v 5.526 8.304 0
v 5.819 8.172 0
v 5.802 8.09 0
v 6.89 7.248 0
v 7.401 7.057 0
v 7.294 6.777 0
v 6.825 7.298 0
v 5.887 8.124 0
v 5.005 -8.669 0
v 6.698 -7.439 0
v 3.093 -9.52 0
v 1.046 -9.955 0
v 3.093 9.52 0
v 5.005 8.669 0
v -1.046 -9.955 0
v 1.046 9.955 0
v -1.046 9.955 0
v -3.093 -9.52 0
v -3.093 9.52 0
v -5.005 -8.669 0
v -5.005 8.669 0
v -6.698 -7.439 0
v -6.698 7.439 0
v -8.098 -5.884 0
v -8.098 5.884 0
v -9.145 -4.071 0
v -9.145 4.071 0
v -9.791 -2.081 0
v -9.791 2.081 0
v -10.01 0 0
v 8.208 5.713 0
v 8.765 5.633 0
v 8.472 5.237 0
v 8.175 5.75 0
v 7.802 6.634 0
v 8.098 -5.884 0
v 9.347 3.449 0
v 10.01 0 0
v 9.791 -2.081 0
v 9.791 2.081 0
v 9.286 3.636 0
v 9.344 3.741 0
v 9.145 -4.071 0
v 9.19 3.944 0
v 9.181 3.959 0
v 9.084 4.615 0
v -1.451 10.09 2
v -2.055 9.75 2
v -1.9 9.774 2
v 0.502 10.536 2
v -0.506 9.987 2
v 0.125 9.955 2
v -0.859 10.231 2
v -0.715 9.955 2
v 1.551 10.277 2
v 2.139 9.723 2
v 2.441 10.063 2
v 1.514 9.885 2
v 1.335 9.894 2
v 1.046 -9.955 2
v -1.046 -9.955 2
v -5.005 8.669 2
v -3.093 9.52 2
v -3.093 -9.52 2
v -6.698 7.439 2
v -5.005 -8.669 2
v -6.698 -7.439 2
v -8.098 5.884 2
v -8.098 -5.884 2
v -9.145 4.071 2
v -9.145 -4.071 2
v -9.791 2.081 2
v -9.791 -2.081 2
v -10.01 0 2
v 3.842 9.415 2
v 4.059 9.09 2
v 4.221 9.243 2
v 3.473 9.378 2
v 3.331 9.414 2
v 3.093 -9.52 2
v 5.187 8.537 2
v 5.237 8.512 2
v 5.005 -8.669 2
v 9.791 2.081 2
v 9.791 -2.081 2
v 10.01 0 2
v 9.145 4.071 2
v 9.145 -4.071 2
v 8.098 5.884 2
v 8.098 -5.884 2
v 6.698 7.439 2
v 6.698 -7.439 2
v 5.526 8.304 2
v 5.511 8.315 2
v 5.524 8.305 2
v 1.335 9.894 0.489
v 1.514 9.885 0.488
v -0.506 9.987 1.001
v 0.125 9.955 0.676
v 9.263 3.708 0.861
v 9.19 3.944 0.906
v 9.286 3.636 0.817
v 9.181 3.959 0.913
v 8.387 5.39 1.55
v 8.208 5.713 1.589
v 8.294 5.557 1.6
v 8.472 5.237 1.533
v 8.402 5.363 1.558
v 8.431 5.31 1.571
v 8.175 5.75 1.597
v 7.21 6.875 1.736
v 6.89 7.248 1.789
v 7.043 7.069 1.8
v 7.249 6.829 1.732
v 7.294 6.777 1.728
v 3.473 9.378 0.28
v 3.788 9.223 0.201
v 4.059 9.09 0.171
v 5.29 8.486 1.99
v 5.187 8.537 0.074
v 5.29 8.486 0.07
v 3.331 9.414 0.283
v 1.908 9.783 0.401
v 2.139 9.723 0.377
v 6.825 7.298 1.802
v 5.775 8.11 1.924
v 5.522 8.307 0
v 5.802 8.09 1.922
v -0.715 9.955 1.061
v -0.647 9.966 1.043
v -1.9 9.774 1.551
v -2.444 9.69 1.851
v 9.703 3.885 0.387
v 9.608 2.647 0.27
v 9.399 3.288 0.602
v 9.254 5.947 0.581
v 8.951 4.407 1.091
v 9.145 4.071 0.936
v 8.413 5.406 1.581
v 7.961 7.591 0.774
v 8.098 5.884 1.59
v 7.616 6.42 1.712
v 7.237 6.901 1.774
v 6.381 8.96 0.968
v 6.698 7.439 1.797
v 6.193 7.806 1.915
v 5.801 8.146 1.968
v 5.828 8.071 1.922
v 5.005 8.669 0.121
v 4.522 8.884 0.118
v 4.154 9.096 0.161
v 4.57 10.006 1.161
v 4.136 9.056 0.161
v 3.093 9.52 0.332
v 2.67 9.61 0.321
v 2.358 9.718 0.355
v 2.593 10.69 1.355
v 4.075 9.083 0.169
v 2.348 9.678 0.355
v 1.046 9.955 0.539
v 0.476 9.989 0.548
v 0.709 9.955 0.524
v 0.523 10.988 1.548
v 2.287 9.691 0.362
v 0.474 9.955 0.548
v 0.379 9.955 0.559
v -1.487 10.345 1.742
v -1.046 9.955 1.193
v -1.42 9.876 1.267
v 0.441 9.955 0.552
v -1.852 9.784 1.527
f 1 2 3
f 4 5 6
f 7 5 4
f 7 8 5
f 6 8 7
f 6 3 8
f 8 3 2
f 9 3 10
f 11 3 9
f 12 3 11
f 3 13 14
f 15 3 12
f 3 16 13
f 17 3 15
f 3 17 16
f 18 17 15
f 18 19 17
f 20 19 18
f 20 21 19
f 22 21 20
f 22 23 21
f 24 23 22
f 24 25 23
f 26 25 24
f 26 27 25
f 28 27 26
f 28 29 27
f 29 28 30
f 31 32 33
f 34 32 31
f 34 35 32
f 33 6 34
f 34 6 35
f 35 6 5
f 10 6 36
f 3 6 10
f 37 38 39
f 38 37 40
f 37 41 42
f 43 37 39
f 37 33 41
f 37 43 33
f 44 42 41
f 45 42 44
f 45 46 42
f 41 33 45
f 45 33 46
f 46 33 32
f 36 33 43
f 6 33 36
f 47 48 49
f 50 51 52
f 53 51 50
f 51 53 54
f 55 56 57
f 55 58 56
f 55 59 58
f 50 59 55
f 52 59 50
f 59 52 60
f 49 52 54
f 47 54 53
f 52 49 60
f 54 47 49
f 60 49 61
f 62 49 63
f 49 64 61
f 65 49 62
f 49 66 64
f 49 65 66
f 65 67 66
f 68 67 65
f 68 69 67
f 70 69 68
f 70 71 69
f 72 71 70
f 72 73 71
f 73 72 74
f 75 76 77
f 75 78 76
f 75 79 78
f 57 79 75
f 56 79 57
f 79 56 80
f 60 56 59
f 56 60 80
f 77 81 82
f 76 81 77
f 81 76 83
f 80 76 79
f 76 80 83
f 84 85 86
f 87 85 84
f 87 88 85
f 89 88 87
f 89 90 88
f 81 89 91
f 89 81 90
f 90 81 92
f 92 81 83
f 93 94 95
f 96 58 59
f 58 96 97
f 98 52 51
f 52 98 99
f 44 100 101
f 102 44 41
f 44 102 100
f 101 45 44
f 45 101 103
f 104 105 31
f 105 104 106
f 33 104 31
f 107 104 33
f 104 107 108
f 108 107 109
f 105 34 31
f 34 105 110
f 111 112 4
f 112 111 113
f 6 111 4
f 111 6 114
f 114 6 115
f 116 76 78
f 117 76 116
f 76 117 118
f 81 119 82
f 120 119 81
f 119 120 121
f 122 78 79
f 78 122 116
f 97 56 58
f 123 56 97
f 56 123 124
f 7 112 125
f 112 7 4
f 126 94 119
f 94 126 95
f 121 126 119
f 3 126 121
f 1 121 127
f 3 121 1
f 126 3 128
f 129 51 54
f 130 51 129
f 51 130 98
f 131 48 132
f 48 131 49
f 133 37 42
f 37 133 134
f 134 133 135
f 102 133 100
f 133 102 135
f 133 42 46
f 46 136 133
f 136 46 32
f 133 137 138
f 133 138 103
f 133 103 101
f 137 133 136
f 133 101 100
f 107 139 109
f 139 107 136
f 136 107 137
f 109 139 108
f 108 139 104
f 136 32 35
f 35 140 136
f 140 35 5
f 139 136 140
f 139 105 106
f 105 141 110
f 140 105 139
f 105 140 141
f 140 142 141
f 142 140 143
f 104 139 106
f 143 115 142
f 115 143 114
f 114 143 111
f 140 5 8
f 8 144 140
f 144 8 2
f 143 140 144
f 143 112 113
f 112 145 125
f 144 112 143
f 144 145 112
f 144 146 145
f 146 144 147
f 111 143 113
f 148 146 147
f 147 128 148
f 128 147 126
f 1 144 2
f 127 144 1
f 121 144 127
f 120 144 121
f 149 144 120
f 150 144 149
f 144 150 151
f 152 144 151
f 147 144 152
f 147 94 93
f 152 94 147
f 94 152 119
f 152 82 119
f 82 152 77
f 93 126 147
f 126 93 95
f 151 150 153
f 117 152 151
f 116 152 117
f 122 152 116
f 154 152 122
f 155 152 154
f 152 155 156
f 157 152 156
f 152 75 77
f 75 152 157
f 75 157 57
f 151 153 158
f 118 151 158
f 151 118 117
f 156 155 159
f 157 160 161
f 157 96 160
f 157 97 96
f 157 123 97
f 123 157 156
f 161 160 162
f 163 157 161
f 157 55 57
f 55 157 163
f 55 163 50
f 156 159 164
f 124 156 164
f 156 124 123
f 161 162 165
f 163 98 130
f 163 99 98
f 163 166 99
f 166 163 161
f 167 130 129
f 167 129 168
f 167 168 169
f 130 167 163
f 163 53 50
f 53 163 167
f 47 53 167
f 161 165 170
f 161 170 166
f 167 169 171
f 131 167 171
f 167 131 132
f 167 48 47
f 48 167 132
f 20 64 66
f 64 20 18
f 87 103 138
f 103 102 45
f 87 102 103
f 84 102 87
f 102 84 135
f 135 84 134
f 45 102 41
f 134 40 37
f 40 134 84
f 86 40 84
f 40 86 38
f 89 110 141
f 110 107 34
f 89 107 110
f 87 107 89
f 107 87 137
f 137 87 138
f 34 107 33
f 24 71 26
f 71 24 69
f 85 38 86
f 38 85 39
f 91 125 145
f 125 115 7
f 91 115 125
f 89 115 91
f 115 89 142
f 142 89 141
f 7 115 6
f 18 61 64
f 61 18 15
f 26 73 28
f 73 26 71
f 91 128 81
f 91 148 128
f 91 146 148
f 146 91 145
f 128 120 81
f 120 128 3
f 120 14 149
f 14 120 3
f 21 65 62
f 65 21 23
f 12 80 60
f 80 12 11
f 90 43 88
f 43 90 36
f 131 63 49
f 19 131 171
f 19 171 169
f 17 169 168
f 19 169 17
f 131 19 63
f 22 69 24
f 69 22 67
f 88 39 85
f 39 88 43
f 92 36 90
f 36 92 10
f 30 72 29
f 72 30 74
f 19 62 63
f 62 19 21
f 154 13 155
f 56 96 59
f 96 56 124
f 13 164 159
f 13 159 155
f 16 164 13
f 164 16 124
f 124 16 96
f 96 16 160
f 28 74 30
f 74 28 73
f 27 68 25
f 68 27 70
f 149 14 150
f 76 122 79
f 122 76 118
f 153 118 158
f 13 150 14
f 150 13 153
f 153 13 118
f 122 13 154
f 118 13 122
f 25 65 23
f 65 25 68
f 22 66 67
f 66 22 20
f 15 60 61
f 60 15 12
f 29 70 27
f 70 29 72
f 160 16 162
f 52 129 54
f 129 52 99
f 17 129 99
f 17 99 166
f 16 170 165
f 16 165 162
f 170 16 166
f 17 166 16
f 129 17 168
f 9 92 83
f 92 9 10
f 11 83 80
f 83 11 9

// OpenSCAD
// Generated by SolidPython 1.1.3 on 2026-01-16 09:16:53


union() {
	intersection() {
		polyhedron(convexity = 2, faces = [[0, 1, 5], [1, 6, 5], [1, 2, 6], [2, 7, 6], [2, 3, 7], [3, 8, 7], [3, 4, 8], [4, 9, 8], [0, 9, 4], [0, 5, 9], [5, 6, 10], [6, 11, 10], [6, 7, 11], [7, 12, 11], [7, 8, 12], [8, 13, 12], [8, 9, 13], [9, 14, 13], [5, 14, 9], [5, 10, 14], [10, 11, 15], [11, 16, 15], [11, 12, 16], [12, 17, 16], [12, 13, 17], [13, 18, 17], [13, 14, 18], [14, 19, 18], [10, 19, 14], [10, 15, 19], [15, 16, 20], [16, 21, 20], [16, 17, 21], [17, 22, 21], [17, 18, 22], [18, 23, 22], [18, 19, 23], [19, 24, 23], [15, 24, 19], [15, 20, 24], [20, 21, 25], [21, 26, 25], [21, 22, 26], [22, 27, 26], [22, 23, 27], [23, 28, 27], [23, 24, 28], [24, 29, 28], [20, 29, 24], [20, 25, 29], [25, 26, 30], [26, 31, 30], [26, 27, 31], [27, 32, 31], [27, 28, 32], [28, 33, 32], [28, 29, 33], [29, 34, 33], [25, 34, 29], [25, 30, 34], [30, 31, 35], [31, 36, 35], [31, 32, 36], [32, 37, 36], [32, 33, 37], [33, 38, 37], [33, 34, 38], [34, 39, 38], [30, 39, 34], [30, 35, 39], [35, 36, 40], [36, 41, 40], [36, 37, 41], [37, 42, 41], [37, 38, 42], [38, 43, 42], [38, 39, 43], [39, 44, 43], [35, 44, 39], [35, 40, 44], [40, 41, 45], [41, 46, 45], [41, 42, 46], [42, 47, 46], [42, 43, 47], [43, 48, 47], [43, 44, 48], [44, 49, 48], [40, 49, 44], [40, 45, 49], [45, 46, 50], [46, 51, 50], [46, 47, 51], [47, 52, 51], [47, 48, 52], [48, 53, 52], [48, 49, 53], [49, 54, 53], [45, 54, 49], [45, 50, 54], [50, 51, 55], [51, 56, 55], [51, 52, 56], [52, 57, 56], [52, 53, 57], [53, 58, 57], [53, 54, 58], [54, 59, 58], [50, 59, 54], [50, 55, 59], [0, 2, 1], [55, 56, 57], [0, 3, 2], [55, 57, 58], [0, 4, 3], [55, 58, 59]], points = [[7.9900000000, 0.0000000000, -1.0000000000], [8.9900000000, 0.0000000000, 0.0000000000], [7.9900000000, 0.0000000000, 1.0000000000], [6.9900000000, 0.0000000000, 0.0000000000], [6.9900000000, 0.0000000000, -1.0000000000], [8.5633109026, 1.6504428974, -0.8064516129], [9.5452395998, 1.8396941418, 0.1935483871], [8.5633109026, 1.6504428974, 1.1935483871], [7.5813822053, 1.4611916530, 0.1935483871], [7.5813822053, 1.4611916530, -0.8064516129], [8.7747649087, 3.5128859559, -0.6129032258], [9.7031328417, 3.8845484116, 0.3870967742], [8.7747649087, 3.5128859559, 1.3870967742], [7.8463969757, 3.1412235002, 0.3870967742], [7.8463969757, 3.1412235002, -0.6129032258], [8.4125353283, 5.4064081746, -0.4193548387], [9.2537888611, 5.9470489920, 0.5806451613], [8.4125353283, 5.4064081746, 1.5806451613], [7.5712817955, 4.8657673571, 0.5806451613], [7.5712817955, 4.8657673571, -0.4193548387], [7.2373403811, 6.9007901148, -0.2258064516], [7.9610744192, 7.5908691263, 0.7741935484], [7.2373403811, 6.9007901148, 1.7741935484], [6.5136063429, 6.2107111033, 0.7741935484], [6.5136063429, 6.2107111033, -0.2258064516], [5.8005690957, 8.1457595205, -0.0322580645], [6.3806260053, 8.9603354726, 0.9677419355], [5.8005690957, 8.1457595205, 1.9677419355], [5.2205121861, 7.3311835685, 0.9677419355], [5.2205121861, 7.3311835685, -0.0322580645], [4.1541501300, 9.0963199535, 0.1612903226], [4.5695651430, 10.0059519489, 1.1612903226], [4.1541501300, 9.0963199535, 2.1612903226], [3.7387351170, 8.1866879582, 1.1612903226], [3.7387351170, 8.1866879582, 0.1612903226], [2.3575893551, 9.7181156832, 0.3548387097], [2.5933482906, 10.6899272516, 1.3548387097], [2.3575893551, 9.7181156832, 2.3548387097], [2.1218304196, 8.7463041149, 1.3548387097], [2.1218304196, 8.7463041149, 0.3548387097], [0.4758191582, 9.9886733918, 0.5483870968], [0.5234010741, 10.9875407310, 1.5483870968], [0.4758191582, 9.9886733918, 2.5483870968], [0.4282372424, 8.9898060526, 1.5483870968], [0.4282372424, 8.9898060526, 0.5483870968], [-1.3451339759, 9.3556123011, 0.7419354839], [-1.4874488142, 10.3454337430, 1.7419354839], [-1.3451339759, 9.3556123011, 2.7419354839], [-1.2028191377, 8.3657908592, 1.7419354839], [-1.2028191377, 8.3657908592, 0.7419354839], [-2.8523299746, 8.2412662308, 0.9354838710], [-3.1793979380, 9.1862670496, 1.9354838710], [-2.8523299746, 8.2412662308, 2.9354838710], [-2.5252620113, 7.2962654121, 1.9354838710], [-2.5252620113, 7.2962654121, 0.9354838710], [-3.9950000000, 6.9195429762, 1.1290322581], [-4.4950000000, 7.7855683800, 2.1290322581], [-3.9950000000, 6.9195429762, 3.1290322581], [-3.4950000000, 6.0535175725, 2.1290322581], [-3.4950000000, 6.0535175725, 1.1290322581]]);
		difference() {
			cylinder($fn = 31, h = 2, r1 = 12.0100000000, r2 = 12.0100000000);
			cylinder($fn = 31, h = 2, r1 = 10, r2 = 10);
		}
	}
	cylinder(h = 2, r = 10.0100000000);
}
/***********************************************
*********      SolidPython code:      **********
************************************************
 
#! /usr/bin/env python3
import math
from math import radians
from typing import Sequence, Tuple, Union

from euclid3 import Point3, Vector3

# NOTE: The PyEuclid on PyPi doesn't include several elements added to
# the module as of 13 Feb 2013.  Add them here until euclid supports them
# TODO: when euclid updates, remove this cruft. -ETJ 13 Feb 2013
from solid import run_euclid_patch, scad_render_to_file
from solid.objects import cylinder, polyhedron
from solid.utils import EPSILON, UP_VEC, bounding_box

run_euclid_patch()

P2 = Tuple[float, float]
P3 = Tuple[float, float, float]
P23 = Union[P2, P3]
Points = Sequence[P23]


def map_segment(
    x: float, domain_min: float, domain_max: float, range_min: float, range_max: float
) -> float:
    if domain_min == domain_max or range_min == range_max:
        return range_min
    proportion = (x - domain_min) / (domain_max - domain_min)
    return (1 - proportion) * range_min + proportion * range_max


def thread(
    outline_pts: Points,
    inner_rad: float,
    pitch: float,
    length: float,
    external: bool = True,
    segments_per_rot: int = 32,
    neck_in_degrees: float = 0,
    neck_out_degrees: float = 0,
    rad_2: float = None,
    inverse_thread_direction: bool = False,
):
    """
    Sweeps outline_pts (an array of points describing a closed polygon in XY)
    through a spiral.

    :param outline_pts: a list of points (NOT an OpenSCAD polygon) that define the cross section of the thread
    :type outline_pts: list

    :param inner_rad: radius of cylinder the screw will wrap around; at base of screw
    :type inner_rad: number

    :param pitch: height for one revolution; must be <= the height of outline_pts bounding box to avoid self-intersection
    :type pitch: number

    :param length: distance from bottom-most point of screw to topmost
    :type length: number

    :param external: if True, the cross-section is external to a cylinder. If False,the segment is internal to it, and outline_pts will be mirrored right-to-left
    :type external: bool

    :param segments_per_rot: segments per rotation
    :type segments_per_rot: int

    :param neck_in_degrees: degrees through which the outer edge of the screw thread will move from a thickness of zero (inner_rad) to its full thickness
    :type neck_in_degrees: number

    :param neck_out_degrees: degrees through which outer edge of the screw thread will move from full thickness back to zero
    :type neck_out_degrees: number

    :param rad_2: radius of cylinder the screw will wrap around at top of screw. Defaults to inner_rad
    :type rad_2: number

    NOTE: This functions works by creating and returning one huge polyhedron, with
    potentially thousands of faces.  An alternate approach would make one single
    polyhedron,then repeat it over and over in the spiral shape, unioning them
    all together.  This would create a similar number of SCAD objects and
    operations, but still require a lot of transforms and unions to be done
    in the SCAD code rather than in the python, as here.  Also would take some
    doing to make the neck-in work as well.  Not sure how the two approaches
    compare in terms of render-time. -ETJ 16 Mar 2011

    NOTE: if pitch is less than or equal to the height of each tooth (outline_pts),
    OpenSCAD will likely crash, since the resulting screw would self-intersect
    all over the place.  For screws with essentially no space between
    threads, (i.e., pitch=tooth_height), I use pitch= tooth_height+EPSILON,
    since pitch=tooth_height will self-intersect for rotations >=1
    """
    # FIXME: For small segments_per_rot where length is not a multiple of
    # pitch, the the generated spiral will have irregularities, since we
    # don't ensure that each level's segments are in line with those above or
    # below. This would require a change in logic to fix. For now, larger values
    # of segments_per_rot and length that divides pitch evenly should avoid this issue
    # -ETJ 02 January 2020

    rad_2 = rad_2 or inner_rad
    rotations = length / pitch

    total_angle = 360 * rotations
    up_step = length / (rotations * segments_per_rot)
    # Add one to total_steps so we have total_steps *segments*
    total_steps = math.ceil(rotations * segments_per_rot) + 1
    step_angle = total_angle / (total_steps - 1)

    all_points = []
    all_tris = []
    euc_up = Vector3(*UP_VEC)
    poly_sides = len(outline_pts)

    # Make Point3s from outline_pts and flip inward for internal threads
    int_ext_angle = 0 if external else math.pi
    outline_pts = [
        Point3(p[0], p[1], 0).rotate_around(axis=euc_up, theta=int_ext_angle)
        for p in outline_pts
    ]

    # If this screw is conical, we'll need to rotate tooth profile to
    # keep it perpendicular to the side of the cone.
    if inner_rad != rad_2:
        cone_angle = -math.atan((rad_2 - inner_rad) / length)
        outline_pts = [
            p.rotate_around(axis=Vector3(*UP_VEC), theta=cone_angle)
            for p in outline_pts
        ]

    # outline_pts, since they were created in 2D , are in the XY plane.
    # But spirals move a profile in XZ around the Z-axis.  So swap Y and Z
    # coordinates... and hope users know about this
    euc_points = list([Point3(p[0], 0, p[1]) for p in outline_pts])

    # Figure out how wide the tooth profile is
    min_bb, max_bb = bounding_box(outline_pts)
    outline_w = max_bb[0] - min_bb[0]
    # outline_h = max_bb[1] - min_bb[1]

    # Calculate where neck-in and neck-out starts/ends
    neck_out_start = total_angle - neck_out_degrees
    neck_distance = (outline_w + EPSILON) * (1 if external else -1)
    section_rads = [
        # radius at start of thread
        max(0, inner_rad - neck_distance),
        # end of neck-in
        map_segment(neck_in_degrees, 0, total_angle, inner_rad, rad_2),
        # start of neck-out
        map_segment(neck_out_start, 0, total_angle, inner_rad, rad_2),
        # end of thread (& neck-out)
        rad_2 - neck_distance,
    ]

    for i in range(total_steps):
        angle = i * step_angle

        elevation = i * up_step
        if angle > total_angle:
            angle = total_angle
            elevation = length

        # Handle the neck-in radius for internal and external threads
        if 0 <= angle < neck_in_degrees:
            rad = map_segment(
                angle, 0, neck_in_degrees, section_rads[0], section_rads[1]
            )
        elif neck_in_degrees <= angle < neck_out_start:
            rad = map_segment(
                angle, neck_in_degrees, neck_out_start, section_rads[1], section_rads[2]
            )
        elif neck_out_start <= angle <= total_angle:
            rad = map_segment(
                angle, neck_out_start, total_angle, section_rads[2], section_rads[3]
            )

        elev_vec = Vector3(rad, 0, elevation)

        # create new points
        for p in euc_points:
            theta = radians(angle) * (-1 if inverse_thread_direction else 1)
            pt = (p + elev_vec).rotate_around(axis=euc_up, theta=theta)
            all_points.append(pt.as_arr())

        # Add the connectivity information
        if i < total_steps - 1:
            ind = i * poly_sides
            for j in range(ind, ind + poly_sides - 1):
                all_tris.append([j, j + 1, j + poly_sides])
                all_tris.append([j + 1, j + poly_sides + 1, j + poly_sides])
            all_tris.append(
                [ind, ind + poly_sides - 1 + poly_sides, ind + poly_sides - 1]
            )
            all_tris.append([ind, ind + poly_sides, ind + poly_sides - 1 + poly_sides])

    # End triangle fans for beginning and end
    last_loop = len(all_points) - poly_sides
    for i in range(poly_sides - 2):
        all_tris.append([0, i + 2, i + 1])
        all_tris.append([last_loop, last_loop + i + 1, last_loop + i + 2])

    # Moving in the opposite direction, we need to reverse the order of
    # corners in each face so the OpenSCAD preview renders correctly
    if inverse_thread_direction:
        all_tris = list([reversed(trio) for trio in all_tris])

    # Make the polyhedron; convexity info needed for correct OpenSCAD render
    a = polyhedron(points=all_points, faces=all_tris, convexity=2)

    if external:
        # Intersect with a cylindrical tube to make sure we fit into
        # the correct dimensions
        tube = cylinder(
            r1=inner_rad + outline_w + EPSILON,
            r2=rad_2 + outline_w + EPSILON,
            h=length,
            segments=segments_per_rot,
        )
        tube -= cylinder(r1=inner_rad, r2=rad_2, h=length, segments=segments_per_rot)
    else:
        # If the threading is internal, intersect with a central cylinder
        # to make sure nothing else remains
        tube = cylinder(r1=inner_rad, r2=rad_2, h=length, segments=segments_per_rot)
    a *= tube

    return a


def default_thread_section(tooth_height: float, tooth_depth: float):
    """
    An isosceles triangle, tooth_height vertically, tooth_depth wide:
    """
    res = [[0, -tooth_height / 2], [tooth_depth, 0], [0, tooth_height / 2]]
    return res


def assembly():
    pts = [(0, -1, 0), (1, 0, 0), (0, 1, 0), (-1, 0, 0), (-1, -1, 0)]

    a = thread(
        pts,
        inner_rad=10,
        pitch=6,
        length=2,
        segments_per_rot=31,
        neck_in_degrees=30,
        neck_out_degrees=30,
    )

    return a + cylinder(10 + EPSILON, 2)


if __name__ == "__main__":
    a = assembly()
    scad_render_to_file(a) 
 
************************************************/
